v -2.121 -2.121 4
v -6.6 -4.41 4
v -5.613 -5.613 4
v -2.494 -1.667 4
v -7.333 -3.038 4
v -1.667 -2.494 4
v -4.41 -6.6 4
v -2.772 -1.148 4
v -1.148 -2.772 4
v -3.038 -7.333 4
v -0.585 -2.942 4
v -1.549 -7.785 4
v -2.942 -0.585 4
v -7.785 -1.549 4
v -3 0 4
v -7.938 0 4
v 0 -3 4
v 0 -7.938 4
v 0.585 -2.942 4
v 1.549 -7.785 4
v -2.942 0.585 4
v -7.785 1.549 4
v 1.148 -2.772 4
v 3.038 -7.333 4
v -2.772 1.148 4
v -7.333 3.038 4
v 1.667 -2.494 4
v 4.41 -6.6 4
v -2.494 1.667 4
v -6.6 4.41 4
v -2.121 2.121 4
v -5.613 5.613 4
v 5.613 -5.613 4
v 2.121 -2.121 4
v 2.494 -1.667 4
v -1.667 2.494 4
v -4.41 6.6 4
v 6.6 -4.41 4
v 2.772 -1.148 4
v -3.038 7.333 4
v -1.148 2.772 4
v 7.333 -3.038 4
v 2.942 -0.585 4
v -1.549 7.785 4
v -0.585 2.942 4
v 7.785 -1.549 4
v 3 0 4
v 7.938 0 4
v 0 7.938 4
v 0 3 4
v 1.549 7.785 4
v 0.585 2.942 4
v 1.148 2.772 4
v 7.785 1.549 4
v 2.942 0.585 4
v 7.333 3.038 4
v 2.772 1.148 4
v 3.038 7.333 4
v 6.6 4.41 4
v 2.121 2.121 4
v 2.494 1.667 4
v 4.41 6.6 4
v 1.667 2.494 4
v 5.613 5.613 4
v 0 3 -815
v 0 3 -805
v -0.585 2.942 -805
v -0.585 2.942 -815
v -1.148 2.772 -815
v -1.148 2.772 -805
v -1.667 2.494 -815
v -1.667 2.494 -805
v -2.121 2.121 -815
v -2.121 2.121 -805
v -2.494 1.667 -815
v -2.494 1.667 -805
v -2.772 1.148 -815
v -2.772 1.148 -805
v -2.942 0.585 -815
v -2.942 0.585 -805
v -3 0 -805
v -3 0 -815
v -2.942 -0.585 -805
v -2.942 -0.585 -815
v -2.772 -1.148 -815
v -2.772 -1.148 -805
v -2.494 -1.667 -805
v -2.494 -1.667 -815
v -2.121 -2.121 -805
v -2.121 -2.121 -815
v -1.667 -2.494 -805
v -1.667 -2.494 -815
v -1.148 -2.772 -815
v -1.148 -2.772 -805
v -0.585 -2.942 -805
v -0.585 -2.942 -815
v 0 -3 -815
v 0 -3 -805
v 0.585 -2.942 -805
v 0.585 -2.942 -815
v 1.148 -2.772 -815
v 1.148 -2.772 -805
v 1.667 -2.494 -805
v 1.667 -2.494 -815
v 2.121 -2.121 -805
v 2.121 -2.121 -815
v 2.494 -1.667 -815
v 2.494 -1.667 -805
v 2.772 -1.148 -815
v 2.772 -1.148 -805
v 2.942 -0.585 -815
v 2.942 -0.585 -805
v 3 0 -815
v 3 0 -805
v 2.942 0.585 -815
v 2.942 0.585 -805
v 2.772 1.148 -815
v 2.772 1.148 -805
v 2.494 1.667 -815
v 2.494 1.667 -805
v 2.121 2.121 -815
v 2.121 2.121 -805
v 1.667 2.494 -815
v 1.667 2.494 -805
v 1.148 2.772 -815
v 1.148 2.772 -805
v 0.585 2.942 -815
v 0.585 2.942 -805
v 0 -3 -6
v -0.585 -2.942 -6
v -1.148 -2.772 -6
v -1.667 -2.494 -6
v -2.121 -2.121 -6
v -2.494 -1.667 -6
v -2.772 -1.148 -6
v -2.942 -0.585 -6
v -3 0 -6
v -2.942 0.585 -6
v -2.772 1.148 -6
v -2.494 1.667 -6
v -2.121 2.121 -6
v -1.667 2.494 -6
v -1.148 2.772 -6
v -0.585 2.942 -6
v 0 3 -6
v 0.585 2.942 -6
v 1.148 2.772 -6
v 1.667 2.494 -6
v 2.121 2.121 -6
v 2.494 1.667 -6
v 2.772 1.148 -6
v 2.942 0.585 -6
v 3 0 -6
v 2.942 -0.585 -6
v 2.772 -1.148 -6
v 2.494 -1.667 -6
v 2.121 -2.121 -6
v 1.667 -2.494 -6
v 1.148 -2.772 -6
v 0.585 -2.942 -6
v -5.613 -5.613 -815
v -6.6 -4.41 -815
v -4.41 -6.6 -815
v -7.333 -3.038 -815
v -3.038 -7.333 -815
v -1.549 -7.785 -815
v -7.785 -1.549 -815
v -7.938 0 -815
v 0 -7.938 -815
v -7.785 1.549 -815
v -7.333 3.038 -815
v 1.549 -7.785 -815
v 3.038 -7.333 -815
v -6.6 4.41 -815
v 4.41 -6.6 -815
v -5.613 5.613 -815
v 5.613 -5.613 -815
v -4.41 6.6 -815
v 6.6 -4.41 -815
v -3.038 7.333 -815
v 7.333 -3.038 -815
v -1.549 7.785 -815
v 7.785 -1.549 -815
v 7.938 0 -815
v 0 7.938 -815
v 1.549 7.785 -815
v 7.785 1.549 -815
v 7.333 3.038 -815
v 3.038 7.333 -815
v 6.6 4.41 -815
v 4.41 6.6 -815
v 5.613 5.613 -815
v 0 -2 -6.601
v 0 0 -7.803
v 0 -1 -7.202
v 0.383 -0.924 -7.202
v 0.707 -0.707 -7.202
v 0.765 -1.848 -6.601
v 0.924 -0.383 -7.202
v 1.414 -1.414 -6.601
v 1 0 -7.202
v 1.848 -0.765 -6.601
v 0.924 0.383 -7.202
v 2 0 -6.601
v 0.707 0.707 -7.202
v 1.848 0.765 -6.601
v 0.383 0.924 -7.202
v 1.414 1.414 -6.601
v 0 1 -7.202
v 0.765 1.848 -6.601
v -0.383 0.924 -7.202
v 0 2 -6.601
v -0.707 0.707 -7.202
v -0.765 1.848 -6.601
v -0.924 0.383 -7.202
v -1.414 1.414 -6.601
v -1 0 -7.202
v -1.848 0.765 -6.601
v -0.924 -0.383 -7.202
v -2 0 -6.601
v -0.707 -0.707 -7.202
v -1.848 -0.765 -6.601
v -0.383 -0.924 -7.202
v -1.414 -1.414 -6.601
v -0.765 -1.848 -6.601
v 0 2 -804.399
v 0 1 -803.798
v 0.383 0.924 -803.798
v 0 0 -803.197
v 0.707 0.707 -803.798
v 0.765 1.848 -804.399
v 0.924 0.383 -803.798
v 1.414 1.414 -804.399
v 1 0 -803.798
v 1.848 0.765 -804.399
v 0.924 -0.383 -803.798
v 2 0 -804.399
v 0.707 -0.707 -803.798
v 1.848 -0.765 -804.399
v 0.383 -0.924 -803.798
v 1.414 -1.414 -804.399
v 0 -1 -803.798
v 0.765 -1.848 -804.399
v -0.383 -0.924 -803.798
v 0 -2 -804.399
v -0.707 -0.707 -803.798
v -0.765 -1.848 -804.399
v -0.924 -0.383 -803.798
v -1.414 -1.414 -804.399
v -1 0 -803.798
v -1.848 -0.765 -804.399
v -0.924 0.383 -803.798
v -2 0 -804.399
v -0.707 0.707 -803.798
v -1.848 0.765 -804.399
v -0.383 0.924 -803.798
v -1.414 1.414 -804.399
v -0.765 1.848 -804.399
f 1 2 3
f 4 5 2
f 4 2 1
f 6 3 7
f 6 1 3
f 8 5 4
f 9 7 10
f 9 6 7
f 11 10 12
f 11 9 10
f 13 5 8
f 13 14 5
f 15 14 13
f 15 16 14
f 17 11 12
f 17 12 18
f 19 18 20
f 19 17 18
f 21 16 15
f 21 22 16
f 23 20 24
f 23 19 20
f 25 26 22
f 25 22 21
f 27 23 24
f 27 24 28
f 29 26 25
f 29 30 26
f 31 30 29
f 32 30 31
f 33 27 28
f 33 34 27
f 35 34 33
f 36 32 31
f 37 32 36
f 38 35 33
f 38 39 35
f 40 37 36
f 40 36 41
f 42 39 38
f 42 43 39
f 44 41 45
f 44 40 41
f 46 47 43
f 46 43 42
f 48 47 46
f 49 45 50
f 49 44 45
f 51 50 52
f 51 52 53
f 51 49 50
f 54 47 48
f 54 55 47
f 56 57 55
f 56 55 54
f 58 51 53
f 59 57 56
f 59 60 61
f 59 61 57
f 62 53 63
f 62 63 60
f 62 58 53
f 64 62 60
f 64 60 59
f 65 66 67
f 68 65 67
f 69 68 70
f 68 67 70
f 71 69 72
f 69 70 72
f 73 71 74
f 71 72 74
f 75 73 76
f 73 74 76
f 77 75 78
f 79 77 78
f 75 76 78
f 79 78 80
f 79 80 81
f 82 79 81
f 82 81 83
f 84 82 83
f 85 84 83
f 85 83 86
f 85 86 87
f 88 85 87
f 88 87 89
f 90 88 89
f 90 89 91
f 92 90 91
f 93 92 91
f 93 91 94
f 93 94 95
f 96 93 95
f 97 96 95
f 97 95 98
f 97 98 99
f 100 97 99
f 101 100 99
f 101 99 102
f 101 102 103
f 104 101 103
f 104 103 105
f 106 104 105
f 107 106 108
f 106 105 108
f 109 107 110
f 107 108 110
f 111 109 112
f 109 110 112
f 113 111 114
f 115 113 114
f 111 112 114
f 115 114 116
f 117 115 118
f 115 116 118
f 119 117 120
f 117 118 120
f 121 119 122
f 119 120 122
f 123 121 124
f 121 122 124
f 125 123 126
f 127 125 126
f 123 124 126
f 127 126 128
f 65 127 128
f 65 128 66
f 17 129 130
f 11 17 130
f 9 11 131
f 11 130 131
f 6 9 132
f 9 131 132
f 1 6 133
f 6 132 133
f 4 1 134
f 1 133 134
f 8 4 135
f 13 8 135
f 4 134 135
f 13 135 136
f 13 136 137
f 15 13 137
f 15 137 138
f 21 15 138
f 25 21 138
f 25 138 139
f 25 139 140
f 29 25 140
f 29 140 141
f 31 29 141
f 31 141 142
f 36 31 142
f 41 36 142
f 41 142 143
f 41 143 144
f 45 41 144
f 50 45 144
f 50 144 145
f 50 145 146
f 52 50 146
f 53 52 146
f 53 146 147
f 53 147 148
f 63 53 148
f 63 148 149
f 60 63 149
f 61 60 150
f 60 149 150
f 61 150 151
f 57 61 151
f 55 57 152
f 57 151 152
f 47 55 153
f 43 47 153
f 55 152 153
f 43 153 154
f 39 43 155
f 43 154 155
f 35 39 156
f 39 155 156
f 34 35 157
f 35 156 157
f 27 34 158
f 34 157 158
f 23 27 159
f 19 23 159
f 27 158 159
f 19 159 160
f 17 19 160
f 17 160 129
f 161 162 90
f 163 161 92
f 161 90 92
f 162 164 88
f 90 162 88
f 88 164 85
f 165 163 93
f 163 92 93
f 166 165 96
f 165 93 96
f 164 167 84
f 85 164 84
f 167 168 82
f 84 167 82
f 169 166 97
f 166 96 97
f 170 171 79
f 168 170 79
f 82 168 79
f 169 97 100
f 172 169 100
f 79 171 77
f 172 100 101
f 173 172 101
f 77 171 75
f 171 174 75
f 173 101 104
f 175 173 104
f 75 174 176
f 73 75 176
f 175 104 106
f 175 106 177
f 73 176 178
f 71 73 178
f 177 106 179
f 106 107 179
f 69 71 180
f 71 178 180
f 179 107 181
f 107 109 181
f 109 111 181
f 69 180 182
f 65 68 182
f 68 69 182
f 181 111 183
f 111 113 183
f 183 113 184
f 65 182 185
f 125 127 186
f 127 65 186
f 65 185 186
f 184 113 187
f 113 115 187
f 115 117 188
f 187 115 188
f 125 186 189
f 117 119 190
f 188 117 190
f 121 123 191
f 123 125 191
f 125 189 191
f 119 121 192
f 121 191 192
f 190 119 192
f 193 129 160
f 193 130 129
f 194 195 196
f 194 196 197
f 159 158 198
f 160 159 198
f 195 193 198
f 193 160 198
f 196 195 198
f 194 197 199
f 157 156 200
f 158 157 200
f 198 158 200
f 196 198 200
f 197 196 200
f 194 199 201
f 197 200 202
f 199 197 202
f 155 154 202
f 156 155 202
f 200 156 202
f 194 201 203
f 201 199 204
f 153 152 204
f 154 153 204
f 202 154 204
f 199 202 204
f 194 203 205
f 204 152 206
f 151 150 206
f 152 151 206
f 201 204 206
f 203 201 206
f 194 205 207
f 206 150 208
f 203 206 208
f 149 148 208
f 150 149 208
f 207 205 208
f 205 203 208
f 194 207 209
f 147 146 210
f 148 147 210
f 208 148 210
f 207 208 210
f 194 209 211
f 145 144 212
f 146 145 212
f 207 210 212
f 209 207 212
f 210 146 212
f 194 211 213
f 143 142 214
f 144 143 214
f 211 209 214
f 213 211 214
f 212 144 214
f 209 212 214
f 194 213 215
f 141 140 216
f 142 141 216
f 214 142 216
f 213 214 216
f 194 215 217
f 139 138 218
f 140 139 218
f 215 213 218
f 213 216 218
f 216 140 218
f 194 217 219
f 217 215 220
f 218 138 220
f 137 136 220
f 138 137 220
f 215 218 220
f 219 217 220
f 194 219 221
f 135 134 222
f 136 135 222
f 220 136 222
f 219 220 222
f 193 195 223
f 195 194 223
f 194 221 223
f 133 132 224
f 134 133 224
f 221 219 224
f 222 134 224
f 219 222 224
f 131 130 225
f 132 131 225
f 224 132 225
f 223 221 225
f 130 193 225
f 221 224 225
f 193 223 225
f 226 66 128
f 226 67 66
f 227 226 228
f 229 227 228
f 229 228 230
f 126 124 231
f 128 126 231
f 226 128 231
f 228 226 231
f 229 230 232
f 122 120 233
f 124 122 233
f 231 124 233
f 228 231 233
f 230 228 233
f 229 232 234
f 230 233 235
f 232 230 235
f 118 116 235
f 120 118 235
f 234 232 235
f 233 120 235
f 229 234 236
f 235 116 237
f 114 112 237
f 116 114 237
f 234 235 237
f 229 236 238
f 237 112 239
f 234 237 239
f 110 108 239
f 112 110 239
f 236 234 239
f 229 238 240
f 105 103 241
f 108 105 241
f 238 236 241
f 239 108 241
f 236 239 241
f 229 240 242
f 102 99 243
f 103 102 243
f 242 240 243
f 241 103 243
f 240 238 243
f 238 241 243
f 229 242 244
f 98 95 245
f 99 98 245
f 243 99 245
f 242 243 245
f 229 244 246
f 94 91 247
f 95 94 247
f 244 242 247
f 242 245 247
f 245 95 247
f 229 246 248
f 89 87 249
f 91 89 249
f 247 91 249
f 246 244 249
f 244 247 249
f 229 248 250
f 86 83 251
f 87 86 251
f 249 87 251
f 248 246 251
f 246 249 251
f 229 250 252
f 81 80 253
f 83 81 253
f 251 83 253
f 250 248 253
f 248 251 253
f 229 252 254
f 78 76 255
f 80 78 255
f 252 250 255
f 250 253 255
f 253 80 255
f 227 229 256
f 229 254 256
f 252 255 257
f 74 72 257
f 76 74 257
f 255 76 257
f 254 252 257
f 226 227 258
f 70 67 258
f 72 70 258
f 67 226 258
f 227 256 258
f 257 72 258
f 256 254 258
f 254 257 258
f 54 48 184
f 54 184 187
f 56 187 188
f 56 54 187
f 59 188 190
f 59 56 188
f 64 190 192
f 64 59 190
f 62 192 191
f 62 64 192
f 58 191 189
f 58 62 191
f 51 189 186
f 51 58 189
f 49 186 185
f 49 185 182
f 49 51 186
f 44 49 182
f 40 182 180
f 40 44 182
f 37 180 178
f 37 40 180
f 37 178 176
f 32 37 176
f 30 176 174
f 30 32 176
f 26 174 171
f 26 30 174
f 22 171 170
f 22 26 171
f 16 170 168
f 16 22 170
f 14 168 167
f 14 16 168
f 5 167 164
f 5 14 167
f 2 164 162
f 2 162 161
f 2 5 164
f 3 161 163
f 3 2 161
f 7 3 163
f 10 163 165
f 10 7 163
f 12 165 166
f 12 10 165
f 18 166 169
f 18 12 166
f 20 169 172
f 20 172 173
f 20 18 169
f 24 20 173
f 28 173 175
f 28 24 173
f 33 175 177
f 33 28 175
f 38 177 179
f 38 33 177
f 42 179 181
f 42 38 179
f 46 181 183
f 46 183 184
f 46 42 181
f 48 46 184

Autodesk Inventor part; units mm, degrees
ref_plane "YZ Plane" through (0, 0, 0) normal (1, 0, 0) x (0, 1, 0)
ref_plane "XZ Plane" through (0, 0, 0) normal (0, 1, 0) x (-1, 0, 0)
ref_plane "XY Plane" through (0, 0, 0) normal (0, 0, 1) x (1, 0, 0)
sketch "Boceto2" plane through (0, 0, 0) normal (0, 0, 1) x (1, 0, 0)
  circle A0 centre (0, 0) radius 7.9375
  dimension "d0" = 15.875
extrude "Extrusión1" add sketch "Boceto2" against normal blind 815
sketch "Boceto3" plane through (0, 0, 0) normal (0, 0, 1) x (1, 0, 0)
  circle A0 centre (0, 0) radius 7.9375 projected
extrude "Extrusión2" add sketch "Boceto3" along normal blind 4
sketch "Boceto6" plane through (0, 0, 4) normal (0, 0, 1) x (1, 0, 0)
  circle A0 centre (0, 0) radius 3
  dimension "d15" = 6
sketch "Boceto7" plane through (0, 0, -815) normal (0, 0, -1) x (-1, 0, 0)
  circle A0 centre (0, 0) radius 3
  dimension "d16" = 6
hole "Agujero1" at (0, 0, -815) direction (0, 0, 1) diameter 6 depth 10 tip angle 118
hole "Agujero2" at (0, 0, 4) direction (0, 0, -1) diameter 6 depth 10 tip angle 118
thread "Rosca3" size "M6x1" class "6H" standard "ANSI Metric M Profile" length 8
thread "Rosca5" size "M6x1" class "6H" standard "ANSI Metric M Profile" length 8
properties part number "barra" material "Acero inoxidable AISI 304"
